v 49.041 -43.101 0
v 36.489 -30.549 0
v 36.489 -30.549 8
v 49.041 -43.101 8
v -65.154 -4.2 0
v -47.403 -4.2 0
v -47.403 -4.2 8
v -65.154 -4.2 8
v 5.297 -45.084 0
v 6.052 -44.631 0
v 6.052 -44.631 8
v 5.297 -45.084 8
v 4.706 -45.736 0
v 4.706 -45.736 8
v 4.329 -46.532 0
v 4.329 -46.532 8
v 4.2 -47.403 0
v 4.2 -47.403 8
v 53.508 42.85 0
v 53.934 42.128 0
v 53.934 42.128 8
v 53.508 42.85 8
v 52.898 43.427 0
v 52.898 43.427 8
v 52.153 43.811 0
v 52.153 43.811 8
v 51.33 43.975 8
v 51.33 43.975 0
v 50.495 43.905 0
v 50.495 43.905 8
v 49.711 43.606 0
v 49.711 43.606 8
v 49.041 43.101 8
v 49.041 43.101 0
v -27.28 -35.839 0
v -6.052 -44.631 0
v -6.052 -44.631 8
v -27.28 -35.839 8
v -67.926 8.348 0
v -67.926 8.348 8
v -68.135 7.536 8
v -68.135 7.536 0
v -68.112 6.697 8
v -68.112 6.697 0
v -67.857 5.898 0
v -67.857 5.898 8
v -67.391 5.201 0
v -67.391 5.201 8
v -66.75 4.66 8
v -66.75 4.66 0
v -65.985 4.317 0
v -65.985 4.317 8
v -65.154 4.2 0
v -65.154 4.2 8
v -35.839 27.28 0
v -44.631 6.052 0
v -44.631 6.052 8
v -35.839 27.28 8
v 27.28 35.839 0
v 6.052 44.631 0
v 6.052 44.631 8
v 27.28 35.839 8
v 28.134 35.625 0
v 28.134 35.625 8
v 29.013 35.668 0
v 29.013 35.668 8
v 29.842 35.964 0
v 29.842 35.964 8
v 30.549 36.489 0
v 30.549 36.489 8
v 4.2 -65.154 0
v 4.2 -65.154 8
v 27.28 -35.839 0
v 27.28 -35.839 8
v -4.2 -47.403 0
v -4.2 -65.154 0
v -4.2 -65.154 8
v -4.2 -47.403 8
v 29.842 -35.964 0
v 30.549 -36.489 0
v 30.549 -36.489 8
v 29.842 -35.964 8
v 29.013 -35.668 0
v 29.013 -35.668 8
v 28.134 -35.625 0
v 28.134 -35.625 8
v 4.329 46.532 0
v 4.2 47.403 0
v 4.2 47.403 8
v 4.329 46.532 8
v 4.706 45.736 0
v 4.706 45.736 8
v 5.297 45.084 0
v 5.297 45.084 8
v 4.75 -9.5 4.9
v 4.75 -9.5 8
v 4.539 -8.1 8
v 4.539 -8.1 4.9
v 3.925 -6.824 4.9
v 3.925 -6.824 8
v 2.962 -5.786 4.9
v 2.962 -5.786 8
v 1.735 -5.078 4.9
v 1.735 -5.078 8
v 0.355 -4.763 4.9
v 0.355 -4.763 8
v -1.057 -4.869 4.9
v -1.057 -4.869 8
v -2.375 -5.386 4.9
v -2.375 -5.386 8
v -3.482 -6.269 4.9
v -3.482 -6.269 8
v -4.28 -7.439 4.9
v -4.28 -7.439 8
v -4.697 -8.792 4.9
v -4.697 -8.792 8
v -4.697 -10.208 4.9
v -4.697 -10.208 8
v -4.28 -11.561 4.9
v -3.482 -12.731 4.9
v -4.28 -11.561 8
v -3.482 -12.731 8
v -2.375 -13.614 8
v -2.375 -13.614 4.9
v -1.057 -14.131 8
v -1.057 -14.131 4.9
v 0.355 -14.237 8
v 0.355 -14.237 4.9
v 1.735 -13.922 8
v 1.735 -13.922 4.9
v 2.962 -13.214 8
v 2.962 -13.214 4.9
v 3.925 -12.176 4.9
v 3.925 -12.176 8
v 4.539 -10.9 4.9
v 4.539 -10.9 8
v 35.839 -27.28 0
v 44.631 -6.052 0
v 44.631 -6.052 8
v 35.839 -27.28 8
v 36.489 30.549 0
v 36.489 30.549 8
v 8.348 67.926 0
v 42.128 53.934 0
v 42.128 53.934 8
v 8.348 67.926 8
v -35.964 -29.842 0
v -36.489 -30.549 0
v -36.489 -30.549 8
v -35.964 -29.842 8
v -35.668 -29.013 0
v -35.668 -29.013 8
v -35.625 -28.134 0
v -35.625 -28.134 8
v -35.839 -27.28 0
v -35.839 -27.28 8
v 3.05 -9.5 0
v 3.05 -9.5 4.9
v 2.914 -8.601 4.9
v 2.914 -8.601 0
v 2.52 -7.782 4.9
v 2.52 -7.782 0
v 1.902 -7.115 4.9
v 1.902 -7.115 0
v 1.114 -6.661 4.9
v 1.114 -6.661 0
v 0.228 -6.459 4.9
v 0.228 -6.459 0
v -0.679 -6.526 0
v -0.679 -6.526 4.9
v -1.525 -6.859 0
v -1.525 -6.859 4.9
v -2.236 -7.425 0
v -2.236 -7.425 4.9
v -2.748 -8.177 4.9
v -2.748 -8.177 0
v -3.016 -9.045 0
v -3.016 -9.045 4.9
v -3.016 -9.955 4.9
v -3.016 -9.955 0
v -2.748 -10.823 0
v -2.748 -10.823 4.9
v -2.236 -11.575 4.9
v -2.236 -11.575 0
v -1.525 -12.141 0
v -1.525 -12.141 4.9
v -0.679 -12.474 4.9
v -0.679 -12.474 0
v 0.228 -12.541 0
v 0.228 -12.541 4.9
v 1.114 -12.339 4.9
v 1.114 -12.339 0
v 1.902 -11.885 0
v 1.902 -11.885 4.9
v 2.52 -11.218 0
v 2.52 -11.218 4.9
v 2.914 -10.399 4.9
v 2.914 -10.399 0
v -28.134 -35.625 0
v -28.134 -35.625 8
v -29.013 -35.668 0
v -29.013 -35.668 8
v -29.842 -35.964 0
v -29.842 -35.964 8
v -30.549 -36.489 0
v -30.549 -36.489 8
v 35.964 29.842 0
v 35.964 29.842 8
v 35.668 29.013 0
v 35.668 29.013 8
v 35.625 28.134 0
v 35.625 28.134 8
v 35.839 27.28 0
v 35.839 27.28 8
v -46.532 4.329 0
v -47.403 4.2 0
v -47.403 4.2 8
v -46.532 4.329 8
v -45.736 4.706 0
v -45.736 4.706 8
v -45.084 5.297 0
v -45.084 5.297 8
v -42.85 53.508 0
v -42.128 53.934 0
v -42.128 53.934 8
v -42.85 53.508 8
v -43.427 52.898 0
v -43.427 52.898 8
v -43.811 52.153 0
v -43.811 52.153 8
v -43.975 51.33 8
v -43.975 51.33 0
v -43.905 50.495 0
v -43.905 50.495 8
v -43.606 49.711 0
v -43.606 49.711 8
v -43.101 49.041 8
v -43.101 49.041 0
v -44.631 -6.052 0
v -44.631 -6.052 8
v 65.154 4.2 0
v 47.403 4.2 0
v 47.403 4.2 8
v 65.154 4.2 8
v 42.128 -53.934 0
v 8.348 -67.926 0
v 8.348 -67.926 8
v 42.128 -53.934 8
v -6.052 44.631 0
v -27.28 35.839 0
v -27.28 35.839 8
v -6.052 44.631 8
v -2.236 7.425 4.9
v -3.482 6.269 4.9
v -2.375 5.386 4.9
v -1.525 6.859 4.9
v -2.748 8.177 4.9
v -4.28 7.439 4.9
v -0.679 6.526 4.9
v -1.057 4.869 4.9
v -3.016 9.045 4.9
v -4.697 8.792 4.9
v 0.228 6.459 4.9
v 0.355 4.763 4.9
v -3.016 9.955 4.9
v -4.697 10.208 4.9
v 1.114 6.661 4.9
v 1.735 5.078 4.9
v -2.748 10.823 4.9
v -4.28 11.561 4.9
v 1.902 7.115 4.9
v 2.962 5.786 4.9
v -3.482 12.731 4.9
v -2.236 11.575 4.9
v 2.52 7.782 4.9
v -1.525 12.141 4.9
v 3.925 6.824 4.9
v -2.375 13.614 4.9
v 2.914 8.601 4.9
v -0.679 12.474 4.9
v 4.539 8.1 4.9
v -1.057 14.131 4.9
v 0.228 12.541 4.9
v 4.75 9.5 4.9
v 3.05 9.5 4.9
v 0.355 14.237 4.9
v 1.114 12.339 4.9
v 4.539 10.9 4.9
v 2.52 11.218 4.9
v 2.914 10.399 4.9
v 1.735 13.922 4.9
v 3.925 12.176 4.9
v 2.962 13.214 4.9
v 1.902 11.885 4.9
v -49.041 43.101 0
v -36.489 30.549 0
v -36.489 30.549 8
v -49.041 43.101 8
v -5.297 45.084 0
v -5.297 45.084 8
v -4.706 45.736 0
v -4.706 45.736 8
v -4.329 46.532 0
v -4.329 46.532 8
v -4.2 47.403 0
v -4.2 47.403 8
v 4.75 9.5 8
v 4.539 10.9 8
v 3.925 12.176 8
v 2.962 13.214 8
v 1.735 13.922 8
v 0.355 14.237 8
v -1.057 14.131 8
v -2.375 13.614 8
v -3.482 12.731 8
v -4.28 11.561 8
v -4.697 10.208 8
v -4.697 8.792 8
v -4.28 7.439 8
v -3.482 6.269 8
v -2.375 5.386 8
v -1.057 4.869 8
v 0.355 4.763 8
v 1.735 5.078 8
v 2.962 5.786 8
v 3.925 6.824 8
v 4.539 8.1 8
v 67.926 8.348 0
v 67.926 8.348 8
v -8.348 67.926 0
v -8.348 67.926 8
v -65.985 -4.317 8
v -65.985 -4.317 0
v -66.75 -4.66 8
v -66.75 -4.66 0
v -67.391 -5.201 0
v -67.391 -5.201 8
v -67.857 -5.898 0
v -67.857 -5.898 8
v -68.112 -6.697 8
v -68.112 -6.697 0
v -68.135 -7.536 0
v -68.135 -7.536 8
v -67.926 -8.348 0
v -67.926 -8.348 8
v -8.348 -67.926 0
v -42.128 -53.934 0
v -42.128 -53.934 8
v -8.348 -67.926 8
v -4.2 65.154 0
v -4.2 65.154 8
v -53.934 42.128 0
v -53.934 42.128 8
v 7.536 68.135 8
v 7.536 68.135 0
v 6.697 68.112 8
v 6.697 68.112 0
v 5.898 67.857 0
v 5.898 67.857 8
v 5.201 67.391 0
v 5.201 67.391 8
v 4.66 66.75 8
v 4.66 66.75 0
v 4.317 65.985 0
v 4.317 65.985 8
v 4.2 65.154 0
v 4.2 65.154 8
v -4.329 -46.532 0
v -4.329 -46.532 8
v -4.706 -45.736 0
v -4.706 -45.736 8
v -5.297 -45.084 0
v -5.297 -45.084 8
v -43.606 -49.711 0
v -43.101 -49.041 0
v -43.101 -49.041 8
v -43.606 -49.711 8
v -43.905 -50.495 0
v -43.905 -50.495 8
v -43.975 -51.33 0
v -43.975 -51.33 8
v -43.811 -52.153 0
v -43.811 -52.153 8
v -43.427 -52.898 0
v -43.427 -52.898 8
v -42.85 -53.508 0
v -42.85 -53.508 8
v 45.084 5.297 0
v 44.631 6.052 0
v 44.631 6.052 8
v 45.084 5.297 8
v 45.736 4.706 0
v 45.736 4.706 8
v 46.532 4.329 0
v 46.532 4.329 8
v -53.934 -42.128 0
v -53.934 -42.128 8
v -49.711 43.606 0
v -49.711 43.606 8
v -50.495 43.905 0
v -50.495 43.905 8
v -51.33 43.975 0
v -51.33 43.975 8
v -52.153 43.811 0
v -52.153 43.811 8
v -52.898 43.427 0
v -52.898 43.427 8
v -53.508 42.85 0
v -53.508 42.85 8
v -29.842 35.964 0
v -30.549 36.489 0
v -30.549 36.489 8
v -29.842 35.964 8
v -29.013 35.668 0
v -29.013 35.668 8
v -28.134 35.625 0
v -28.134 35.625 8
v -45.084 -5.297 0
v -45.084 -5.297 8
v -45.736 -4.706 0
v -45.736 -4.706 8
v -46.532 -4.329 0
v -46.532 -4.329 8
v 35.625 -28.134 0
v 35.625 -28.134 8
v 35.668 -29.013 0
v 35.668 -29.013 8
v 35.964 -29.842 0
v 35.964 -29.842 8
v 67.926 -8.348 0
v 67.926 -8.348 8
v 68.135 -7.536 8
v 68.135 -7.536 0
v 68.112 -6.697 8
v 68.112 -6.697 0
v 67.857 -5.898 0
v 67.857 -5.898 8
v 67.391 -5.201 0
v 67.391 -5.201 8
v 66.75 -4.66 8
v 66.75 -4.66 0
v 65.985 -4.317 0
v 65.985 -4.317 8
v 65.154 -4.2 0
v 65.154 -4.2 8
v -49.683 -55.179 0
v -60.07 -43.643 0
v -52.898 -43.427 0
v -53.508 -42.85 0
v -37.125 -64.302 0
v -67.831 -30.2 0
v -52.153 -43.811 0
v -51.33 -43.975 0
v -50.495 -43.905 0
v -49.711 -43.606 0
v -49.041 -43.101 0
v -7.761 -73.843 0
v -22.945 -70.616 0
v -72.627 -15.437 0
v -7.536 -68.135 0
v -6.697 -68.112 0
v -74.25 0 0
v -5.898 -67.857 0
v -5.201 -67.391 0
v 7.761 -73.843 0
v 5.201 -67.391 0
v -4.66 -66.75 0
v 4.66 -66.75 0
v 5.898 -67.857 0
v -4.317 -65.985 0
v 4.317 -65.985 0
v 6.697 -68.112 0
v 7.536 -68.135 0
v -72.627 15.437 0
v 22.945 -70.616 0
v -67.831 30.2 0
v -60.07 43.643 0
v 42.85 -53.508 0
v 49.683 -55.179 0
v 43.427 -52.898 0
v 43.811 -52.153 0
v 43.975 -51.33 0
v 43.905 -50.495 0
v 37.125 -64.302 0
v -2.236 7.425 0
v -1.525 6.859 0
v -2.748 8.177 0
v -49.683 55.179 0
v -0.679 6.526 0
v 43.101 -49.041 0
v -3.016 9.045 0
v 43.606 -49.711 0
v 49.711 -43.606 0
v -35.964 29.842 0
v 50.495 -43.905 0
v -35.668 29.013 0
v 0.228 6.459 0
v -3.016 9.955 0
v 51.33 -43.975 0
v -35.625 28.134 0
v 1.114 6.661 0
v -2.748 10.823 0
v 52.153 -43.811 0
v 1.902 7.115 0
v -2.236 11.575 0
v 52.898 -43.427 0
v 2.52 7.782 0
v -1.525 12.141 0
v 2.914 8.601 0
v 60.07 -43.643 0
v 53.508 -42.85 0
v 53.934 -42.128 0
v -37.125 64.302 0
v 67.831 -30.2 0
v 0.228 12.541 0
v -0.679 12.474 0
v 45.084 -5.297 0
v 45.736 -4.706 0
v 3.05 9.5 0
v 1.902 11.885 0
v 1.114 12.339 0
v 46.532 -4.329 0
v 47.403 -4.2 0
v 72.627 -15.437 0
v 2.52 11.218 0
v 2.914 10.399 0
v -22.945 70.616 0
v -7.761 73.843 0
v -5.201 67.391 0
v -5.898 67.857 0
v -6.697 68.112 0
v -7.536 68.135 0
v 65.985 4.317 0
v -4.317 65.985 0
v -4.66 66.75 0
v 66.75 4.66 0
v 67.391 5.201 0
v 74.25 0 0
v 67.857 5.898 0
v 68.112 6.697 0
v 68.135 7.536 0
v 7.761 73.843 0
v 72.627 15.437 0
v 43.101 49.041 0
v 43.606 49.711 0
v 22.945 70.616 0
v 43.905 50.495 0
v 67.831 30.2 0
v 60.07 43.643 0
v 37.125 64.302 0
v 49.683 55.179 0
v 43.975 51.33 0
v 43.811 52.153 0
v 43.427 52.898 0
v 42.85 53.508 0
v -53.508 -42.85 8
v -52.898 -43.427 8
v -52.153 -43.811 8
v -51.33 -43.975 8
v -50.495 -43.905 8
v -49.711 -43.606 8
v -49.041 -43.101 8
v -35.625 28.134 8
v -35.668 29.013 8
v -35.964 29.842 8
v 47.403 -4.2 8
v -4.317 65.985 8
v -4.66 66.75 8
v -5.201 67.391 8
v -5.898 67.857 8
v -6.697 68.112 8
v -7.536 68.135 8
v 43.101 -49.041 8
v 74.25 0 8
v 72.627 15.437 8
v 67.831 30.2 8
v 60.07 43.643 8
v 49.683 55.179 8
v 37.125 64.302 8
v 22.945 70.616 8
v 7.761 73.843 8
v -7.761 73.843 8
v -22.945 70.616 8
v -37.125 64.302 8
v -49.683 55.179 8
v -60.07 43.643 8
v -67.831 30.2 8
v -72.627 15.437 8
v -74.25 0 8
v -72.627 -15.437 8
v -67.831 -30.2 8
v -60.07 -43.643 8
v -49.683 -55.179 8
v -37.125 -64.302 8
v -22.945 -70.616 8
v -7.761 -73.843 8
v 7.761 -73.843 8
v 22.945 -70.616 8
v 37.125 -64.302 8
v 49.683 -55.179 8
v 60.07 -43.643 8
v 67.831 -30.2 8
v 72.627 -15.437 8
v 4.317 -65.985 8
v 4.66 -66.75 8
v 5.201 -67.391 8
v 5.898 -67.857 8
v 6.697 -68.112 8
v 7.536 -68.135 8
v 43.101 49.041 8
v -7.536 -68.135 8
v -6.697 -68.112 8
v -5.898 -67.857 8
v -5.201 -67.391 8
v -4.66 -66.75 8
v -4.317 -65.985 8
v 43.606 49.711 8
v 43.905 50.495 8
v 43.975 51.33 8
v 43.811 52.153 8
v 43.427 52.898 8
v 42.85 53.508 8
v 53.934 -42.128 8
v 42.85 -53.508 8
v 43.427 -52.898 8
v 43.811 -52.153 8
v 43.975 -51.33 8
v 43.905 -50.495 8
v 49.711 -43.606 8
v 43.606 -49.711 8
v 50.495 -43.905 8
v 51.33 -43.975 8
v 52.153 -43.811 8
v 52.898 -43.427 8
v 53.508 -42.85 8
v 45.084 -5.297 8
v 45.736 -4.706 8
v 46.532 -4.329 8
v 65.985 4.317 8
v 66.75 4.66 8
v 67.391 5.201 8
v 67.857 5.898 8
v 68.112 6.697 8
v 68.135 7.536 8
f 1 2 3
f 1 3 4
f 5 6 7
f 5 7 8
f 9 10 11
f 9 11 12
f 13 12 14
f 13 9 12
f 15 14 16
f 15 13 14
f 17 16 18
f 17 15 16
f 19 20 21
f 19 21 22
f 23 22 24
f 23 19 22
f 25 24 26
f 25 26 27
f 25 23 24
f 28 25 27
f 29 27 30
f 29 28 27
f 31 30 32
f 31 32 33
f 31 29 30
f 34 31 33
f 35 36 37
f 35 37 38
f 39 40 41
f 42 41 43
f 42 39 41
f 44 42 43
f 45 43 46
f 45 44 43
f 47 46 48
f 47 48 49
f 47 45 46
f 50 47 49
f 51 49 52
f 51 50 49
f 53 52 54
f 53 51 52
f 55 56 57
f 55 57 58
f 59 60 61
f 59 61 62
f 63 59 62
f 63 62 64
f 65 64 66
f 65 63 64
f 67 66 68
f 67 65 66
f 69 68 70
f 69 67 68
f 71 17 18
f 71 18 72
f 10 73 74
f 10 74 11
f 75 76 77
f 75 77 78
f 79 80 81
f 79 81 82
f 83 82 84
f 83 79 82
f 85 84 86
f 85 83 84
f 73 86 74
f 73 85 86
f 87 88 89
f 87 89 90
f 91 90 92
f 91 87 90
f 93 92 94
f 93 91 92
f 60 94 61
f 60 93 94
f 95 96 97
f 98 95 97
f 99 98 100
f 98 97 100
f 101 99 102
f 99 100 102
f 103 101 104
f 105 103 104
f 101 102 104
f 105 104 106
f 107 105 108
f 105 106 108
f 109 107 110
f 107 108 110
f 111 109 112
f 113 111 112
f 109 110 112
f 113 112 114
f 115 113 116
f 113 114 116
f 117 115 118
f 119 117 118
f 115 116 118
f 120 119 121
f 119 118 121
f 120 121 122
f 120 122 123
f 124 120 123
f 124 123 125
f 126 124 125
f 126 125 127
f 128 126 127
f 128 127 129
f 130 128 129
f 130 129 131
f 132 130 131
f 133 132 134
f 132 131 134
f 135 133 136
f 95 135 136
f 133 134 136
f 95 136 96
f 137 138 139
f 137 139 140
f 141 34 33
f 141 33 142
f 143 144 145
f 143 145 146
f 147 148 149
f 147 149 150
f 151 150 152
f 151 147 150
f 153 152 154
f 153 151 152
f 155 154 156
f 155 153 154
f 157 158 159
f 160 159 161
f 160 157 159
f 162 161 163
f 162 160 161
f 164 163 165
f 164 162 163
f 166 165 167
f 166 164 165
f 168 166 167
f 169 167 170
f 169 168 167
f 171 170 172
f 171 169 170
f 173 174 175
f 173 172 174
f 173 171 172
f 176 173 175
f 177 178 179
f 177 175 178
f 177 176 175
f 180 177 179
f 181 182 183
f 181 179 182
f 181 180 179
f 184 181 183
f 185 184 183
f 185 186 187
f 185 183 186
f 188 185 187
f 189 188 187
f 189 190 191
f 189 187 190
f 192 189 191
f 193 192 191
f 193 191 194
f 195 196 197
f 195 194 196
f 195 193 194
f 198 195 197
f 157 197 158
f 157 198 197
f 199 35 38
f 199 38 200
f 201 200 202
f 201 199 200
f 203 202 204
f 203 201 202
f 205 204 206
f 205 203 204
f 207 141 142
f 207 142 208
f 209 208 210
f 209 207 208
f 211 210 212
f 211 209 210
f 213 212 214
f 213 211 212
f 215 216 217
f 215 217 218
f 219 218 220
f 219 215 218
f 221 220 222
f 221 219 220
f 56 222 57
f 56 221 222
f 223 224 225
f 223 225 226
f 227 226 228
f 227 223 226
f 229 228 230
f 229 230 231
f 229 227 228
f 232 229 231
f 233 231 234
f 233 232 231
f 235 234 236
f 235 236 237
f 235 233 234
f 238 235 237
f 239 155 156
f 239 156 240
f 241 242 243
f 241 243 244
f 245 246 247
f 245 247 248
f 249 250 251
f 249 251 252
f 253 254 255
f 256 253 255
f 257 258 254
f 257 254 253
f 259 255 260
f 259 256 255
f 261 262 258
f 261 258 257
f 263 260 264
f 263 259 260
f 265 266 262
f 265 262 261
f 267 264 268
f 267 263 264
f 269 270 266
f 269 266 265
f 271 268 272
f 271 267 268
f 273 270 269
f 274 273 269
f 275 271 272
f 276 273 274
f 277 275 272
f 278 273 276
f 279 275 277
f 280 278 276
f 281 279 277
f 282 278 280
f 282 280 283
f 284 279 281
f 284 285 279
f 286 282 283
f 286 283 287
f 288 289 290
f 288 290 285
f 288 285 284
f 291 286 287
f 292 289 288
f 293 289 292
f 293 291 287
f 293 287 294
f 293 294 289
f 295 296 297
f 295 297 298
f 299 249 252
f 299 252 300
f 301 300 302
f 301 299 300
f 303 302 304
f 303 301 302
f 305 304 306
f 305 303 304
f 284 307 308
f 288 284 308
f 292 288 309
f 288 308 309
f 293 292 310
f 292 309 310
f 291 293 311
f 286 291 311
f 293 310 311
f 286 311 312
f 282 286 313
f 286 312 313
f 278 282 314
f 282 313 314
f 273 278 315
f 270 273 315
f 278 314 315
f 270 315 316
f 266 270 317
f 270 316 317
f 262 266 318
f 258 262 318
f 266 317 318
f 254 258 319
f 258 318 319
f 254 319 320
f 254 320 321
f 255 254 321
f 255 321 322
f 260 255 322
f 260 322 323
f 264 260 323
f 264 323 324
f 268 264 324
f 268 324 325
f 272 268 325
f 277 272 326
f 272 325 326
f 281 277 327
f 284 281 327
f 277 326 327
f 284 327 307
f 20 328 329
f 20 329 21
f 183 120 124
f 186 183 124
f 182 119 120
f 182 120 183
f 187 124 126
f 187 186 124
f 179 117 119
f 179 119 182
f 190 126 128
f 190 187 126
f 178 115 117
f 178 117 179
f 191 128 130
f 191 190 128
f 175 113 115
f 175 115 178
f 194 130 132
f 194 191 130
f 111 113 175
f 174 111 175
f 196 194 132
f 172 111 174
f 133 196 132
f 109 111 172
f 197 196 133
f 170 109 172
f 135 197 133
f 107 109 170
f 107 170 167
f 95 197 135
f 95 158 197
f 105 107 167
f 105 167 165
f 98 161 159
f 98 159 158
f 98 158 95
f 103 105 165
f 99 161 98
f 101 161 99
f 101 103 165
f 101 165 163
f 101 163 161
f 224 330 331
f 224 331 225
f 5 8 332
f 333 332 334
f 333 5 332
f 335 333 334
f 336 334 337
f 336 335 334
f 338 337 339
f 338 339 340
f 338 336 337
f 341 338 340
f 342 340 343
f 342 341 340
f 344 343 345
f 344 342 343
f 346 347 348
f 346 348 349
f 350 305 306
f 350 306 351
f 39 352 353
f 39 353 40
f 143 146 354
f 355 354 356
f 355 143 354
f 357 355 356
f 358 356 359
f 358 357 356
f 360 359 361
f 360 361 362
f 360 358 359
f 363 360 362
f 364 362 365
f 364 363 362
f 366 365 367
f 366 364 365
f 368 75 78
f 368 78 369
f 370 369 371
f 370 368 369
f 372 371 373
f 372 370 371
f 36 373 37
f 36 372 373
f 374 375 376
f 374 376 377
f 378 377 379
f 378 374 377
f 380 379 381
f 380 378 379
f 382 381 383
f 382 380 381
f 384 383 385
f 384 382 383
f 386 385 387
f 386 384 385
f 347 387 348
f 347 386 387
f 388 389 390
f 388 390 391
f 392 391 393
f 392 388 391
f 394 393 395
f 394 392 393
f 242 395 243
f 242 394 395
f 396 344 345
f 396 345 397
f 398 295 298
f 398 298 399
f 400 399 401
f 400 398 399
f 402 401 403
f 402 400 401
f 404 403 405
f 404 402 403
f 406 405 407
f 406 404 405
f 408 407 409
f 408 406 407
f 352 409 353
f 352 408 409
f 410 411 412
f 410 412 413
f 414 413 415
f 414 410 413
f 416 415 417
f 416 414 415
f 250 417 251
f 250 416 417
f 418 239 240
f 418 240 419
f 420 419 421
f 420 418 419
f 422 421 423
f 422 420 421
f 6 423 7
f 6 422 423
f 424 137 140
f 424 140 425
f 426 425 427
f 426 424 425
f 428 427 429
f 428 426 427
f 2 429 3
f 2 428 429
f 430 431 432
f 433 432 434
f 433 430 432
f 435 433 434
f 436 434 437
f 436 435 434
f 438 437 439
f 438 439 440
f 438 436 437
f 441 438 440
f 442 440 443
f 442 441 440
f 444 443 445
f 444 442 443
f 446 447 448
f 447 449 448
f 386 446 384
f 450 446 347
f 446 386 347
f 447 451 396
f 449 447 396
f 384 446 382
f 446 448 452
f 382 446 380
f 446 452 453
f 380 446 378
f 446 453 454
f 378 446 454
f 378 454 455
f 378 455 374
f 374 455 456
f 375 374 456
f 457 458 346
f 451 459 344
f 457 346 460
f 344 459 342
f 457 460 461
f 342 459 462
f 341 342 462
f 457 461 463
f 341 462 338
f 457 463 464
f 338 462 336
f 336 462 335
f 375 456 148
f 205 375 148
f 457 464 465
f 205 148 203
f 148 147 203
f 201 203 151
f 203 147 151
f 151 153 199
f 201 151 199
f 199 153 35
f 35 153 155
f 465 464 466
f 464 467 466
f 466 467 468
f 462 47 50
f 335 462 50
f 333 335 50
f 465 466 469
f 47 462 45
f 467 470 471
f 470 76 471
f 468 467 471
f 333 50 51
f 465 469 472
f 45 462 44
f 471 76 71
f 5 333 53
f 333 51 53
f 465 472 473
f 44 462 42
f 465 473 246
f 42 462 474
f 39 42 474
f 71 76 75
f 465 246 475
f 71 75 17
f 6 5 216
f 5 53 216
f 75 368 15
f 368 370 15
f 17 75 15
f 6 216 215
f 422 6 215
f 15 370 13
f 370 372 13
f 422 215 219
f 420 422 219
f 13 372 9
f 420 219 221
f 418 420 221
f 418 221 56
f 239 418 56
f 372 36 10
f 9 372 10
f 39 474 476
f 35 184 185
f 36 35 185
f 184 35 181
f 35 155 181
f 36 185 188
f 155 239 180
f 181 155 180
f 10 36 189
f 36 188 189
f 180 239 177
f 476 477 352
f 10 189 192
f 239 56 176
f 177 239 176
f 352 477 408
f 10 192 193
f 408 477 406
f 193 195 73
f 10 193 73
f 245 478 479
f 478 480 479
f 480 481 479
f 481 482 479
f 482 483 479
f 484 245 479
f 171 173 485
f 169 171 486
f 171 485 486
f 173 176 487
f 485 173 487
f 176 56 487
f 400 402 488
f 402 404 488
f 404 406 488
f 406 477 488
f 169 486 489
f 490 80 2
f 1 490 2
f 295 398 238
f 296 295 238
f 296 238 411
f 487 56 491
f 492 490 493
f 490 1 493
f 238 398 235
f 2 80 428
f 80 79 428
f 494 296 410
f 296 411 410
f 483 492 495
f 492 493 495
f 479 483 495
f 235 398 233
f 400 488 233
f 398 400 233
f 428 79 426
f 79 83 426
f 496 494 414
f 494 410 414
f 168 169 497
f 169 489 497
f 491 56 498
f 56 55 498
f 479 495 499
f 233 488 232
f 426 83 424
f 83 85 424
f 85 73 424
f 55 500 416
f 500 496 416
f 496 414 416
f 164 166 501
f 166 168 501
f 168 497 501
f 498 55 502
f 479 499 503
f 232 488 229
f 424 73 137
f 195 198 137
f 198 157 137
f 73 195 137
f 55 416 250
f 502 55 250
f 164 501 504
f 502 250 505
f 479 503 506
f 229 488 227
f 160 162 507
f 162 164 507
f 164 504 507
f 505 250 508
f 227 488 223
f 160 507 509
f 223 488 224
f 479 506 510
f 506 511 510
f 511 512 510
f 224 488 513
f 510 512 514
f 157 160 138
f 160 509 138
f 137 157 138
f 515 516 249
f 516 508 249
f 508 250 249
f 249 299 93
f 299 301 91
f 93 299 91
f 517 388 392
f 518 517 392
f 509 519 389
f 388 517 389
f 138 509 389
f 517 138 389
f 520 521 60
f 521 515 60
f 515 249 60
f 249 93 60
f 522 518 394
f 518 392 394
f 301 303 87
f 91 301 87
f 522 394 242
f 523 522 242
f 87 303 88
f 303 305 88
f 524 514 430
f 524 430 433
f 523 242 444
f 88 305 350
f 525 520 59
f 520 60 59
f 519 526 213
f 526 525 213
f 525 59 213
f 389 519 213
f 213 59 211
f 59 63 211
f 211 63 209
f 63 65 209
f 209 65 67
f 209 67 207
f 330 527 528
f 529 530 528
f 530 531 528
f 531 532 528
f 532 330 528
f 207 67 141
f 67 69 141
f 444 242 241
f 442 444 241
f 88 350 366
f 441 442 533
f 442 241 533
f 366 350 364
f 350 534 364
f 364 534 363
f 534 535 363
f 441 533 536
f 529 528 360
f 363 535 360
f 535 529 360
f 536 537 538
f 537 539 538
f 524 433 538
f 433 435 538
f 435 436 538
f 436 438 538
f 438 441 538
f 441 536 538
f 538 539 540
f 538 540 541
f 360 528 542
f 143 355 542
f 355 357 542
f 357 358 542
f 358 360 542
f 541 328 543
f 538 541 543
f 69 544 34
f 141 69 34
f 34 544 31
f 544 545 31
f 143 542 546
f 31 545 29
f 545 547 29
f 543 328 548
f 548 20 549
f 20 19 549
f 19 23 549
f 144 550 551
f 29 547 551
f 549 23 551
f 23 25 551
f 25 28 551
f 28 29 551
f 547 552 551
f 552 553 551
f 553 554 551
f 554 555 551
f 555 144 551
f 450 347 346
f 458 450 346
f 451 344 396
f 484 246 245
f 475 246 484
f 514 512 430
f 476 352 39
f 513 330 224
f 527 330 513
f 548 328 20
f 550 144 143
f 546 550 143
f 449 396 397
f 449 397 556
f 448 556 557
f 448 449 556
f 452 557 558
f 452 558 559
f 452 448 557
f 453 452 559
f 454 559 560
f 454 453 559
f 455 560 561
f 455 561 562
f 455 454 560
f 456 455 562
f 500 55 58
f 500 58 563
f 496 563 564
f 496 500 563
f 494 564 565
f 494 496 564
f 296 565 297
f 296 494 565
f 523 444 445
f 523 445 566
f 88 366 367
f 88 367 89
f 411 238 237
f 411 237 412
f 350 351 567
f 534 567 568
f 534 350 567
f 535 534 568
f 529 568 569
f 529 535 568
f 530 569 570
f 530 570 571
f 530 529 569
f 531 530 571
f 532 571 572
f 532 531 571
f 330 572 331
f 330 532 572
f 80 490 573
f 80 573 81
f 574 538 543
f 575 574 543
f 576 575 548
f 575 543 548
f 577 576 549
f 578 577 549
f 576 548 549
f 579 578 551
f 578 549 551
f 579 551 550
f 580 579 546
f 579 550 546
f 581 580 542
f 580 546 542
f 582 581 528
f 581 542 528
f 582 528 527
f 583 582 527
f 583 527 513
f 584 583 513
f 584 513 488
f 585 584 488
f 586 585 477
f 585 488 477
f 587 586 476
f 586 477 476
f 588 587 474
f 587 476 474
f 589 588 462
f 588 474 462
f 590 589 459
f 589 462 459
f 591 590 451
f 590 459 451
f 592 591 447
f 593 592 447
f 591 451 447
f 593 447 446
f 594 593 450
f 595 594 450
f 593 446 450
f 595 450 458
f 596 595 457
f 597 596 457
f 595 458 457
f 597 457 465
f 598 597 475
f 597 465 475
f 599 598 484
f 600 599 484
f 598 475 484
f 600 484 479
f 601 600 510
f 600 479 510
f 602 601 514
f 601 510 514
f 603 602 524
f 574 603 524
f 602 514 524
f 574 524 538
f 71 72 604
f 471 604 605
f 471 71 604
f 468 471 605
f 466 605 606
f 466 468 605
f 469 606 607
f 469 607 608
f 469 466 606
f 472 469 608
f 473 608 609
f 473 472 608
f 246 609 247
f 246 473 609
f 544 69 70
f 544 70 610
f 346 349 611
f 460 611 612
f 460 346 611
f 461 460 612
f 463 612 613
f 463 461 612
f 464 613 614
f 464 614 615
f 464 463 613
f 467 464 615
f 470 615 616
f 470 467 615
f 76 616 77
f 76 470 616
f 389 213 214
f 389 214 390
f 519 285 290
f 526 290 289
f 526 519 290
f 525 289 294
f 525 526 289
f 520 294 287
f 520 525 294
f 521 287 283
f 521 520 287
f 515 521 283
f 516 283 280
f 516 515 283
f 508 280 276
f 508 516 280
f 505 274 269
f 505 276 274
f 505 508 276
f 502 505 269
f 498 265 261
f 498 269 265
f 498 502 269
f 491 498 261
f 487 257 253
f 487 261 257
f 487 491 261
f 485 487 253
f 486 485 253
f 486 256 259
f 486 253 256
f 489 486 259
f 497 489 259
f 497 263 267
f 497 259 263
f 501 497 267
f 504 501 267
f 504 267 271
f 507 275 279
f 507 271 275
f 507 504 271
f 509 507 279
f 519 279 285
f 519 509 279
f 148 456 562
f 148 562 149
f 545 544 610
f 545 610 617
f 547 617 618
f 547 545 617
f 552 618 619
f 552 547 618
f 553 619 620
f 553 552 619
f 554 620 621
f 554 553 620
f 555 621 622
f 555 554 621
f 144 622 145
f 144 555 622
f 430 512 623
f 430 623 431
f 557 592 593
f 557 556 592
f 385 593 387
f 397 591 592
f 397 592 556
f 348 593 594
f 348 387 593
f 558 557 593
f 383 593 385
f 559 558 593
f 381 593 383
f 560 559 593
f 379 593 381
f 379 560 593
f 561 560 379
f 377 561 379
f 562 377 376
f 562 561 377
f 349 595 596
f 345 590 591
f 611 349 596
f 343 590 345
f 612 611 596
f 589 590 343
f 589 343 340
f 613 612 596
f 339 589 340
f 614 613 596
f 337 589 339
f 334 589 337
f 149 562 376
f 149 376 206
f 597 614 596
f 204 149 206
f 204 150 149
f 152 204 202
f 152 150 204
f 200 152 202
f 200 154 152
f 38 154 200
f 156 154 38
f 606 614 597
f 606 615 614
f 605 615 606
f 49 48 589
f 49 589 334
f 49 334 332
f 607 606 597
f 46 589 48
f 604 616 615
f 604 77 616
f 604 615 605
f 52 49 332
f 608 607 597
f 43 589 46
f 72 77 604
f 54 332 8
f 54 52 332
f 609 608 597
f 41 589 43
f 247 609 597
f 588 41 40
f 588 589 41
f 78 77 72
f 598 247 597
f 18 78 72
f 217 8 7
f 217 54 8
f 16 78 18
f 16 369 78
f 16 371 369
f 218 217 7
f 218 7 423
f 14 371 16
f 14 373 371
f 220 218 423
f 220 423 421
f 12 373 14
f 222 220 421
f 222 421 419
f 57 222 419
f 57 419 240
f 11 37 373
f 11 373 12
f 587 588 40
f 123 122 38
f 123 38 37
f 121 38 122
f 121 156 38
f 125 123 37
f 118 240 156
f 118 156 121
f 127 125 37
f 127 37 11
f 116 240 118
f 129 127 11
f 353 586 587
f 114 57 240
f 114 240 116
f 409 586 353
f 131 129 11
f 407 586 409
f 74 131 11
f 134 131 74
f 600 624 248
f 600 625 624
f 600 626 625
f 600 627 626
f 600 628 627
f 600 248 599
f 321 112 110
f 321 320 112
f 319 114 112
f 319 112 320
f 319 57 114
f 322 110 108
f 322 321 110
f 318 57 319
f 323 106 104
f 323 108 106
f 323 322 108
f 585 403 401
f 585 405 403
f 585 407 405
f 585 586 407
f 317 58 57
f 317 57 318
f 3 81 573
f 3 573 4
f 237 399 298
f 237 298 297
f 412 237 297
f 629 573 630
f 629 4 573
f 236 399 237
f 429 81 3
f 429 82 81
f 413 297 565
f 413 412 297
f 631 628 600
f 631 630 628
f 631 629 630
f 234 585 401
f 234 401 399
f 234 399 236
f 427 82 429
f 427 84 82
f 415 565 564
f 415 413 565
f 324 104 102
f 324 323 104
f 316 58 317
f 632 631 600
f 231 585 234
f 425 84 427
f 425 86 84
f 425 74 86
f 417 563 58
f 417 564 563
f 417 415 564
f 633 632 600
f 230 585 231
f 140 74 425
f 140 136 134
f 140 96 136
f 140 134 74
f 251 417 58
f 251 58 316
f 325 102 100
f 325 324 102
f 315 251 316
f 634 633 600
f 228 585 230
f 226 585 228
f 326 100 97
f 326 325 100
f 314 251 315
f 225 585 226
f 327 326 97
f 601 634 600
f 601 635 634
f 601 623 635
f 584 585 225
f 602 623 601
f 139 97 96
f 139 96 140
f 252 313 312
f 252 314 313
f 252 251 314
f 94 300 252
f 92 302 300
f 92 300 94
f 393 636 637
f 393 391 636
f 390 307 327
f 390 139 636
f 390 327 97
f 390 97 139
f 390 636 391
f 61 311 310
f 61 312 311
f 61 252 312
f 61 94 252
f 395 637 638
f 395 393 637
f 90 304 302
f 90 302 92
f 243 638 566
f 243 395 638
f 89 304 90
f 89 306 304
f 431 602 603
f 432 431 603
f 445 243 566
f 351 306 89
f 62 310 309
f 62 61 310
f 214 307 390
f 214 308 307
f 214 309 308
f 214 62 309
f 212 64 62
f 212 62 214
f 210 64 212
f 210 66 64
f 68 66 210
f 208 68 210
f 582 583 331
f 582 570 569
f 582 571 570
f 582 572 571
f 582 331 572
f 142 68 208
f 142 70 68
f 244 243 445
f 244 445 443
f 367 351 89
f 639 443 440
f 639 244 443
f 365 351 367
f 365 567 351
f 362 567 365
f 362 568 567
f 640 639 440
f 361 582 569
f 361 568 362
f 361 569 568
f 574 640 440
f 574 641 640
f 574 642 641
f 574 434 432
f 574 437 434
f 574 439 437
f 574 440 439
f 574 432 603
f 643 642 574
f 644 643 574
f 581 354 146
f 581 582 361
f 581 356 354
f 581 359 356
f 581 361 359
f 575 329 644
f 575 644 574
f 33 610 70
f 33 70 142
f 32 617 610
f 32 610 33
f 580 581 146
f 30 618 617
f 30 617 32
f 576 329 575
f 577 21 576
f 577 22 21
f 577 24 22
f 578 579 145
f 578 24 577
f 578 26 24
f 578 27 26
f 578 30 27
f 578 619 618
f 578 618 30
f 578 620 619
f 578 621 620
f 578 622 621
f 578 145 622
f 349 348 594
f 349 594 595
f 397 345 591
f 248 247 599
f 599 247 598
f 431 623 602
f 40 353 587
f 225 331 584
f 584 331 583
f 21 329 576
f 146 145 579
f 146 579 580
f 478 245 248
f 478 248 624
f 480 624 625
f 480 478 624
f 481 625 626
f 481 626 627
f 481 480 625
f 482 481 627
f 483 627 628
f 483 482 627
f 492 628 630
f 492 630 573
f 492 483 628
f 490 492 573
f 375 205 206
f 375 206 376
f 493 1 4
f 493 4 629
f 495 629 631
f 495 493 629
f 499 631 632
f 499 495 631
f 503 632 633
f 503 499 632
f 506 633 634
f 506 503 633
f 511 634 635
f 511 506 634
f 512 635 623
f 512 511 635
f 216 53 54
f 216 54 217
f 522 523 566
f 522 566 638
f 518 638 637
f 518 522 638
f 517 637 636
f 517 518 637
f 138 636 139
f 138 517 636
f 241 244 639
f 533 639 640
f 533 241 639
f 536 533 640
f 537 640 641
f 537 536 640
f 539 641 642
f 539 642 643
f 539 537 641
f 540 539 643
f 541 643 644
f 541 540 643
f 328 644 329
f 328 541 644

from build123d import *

# Parameters (mm, degrees)
SKETCH1_R           = 74.25
SKETCH1_R_2         = 3.05
BOSS_EXTRUDE1_DEPTH = 8
SKETCH2_R           = 4.75
CUT_EXTRUDE1_DEPTH  = 3.1


with BuildPart() as part:
    # Sketch1 → Boss-Extrude1 (new body)
    with BuildSketch(Plane.XY):
        Circle(SKETCH1_R)
        with Locations((0, 9.5)):
            Circle(SKETCH1_R_2, mode=Mode.SUBTRACT)
        with Locations((0, -9.5)):
            Circle(SKETCH1_R_2, mode=Mode.SUBTRACT)
        with BuildLine():
            Line((67.925889957, 8.348050297), (53.933820381, 42.127894432))
            ThreePointArc((53.933820381, 42.127894432), (51.74745275, 43.922199976), (49.04086144, 43.101164478))
            Line((49.04086144, 43.101164478), (36.488844859, 30.549147897))
            ThreePointArc((36.488844859, 30.549147897), (35.667809361, 29.013098519), (35.838526605, 27.279777256))
            Line((35.838526605, 27.279777256), (44.631380677, 6.051949703))
            ThreePointArc((44.631380677, 6.051949703), (45.736308575, 4.705591163), (47.403019275, 4.2))
            Line((47.403019275, 4.2), (65.154251359, 4.2))
            ThreePointArc((65.154251359, 4.2), (67.648660196, 5.533289301), (67.925889957, 8.348050297))
        make_face(mode=Mode.SUBTRACT)
        with BuildLine():
            Line((42.127894432, 53.933820381), (8.348050297, 67.925889957))
            ThreePointArc((8.348050297, 67.925889957), (5.533289301, 67.648660196), (4.2, 65.154251359))
            Line((4.2, 65.154251359), (4.2, 47.403019275))
            ThreePointArc((4.2, 47.403019275), (4.705591163, 45.736308575), (6.051949703, 44.631380677))
            Line((6.051949703, 44.631380677), (27.279777256, 35.838526605))
            ThreePointArc((27.279777256, 35.838526605), (29.013098519, 35.667809361), (30.549147897, 36.488844859))
            Line((30.549147897, 36.488844859), (43.101164478, 49.04086144))
            ThreePointArc((43.101164478, 49.04086144), (43.922199976, 51.74745275), (42.127894432, 53.933820381))
        make_face(mode=Mode.SUBTRACT)
        with BuildLine():
            Line((-8.348050297, 67.925889957), (-42.127894432, 53.933820381))
            ThreePointArc((-42.127894432, 53.933820381), (-43.922199976, 51.74745275), (-43.101164478, 49.04086144))
            Line((-43.101164478, 49.04086144), (-30.549147897, 36.488844859))
            ThreePointArc((-30.549147897, 36.488844859), (-29.013098519, 35.667809361), (-27.279777256, 35.838526605))
            Line((-27.279777256, 35.838526605), (-6.051949703, 44.631380677))
            ThreePointArc((-6.051949703, 44.631380677), (-4.705591163, 45.736308575), (-4.2, 47.403019275))
            Line((-4.2, 47.403019275), (-4.2, 65.154251359))
            ThreePointArc((-4.2, 65.154251359), (-5.533289301, 67.648660196), (-8.348050297, 67.925889957))
        make_face(mode=Mode.SUBTRACT)
        with BuildLine():
            Line((-53.933820381, 42.127894432), (-67.925889957, 8.348050297))
            ThreePointArc((-67.925889957, 8.348050297), (-67.648660196, 5.533289301), (-65.154251359, 4.2))
            Line((-65.154251359, 4.2), (-47.403019275, 4.2))
            ThreePointArc((-47.403019275, 4.2), (-45.736308575, 4.705591163), (-44.631380677, 6.051949703))
            Line((-44.631380677, 6.051949703), (-35.838526605, 27.279777256))
            ThreePointArc((-35.838526605, 27.279777256), (-35.667809361, 29.013098519), (-36.488844859, 30.549147897))
            Line((-36.488844859, 30.549147897), (-49.04086144, 43.101164478))
            ThreePointArc((-49.04086144, 43.101164478), (-51.74745275, 43.922199976), (-53.933820381, 42.127894432))
        make_face(mode=Mode.SUBTRACT)
        with BuildLine():
            Line((-67.925889957, -8.348050297), (-53.933820381, -42.127894432))
            ThreePointArc((-53.933820381, -42.127894432), (-51.74745275, -43.922199976), (-49.04086144, -43.101164478))
            Line((-49.04086144, -43.101164478), (-36.488844859, -30.549147897))
            ThreePointArc((-36.488844859, -30.549147897), (-35.667809361, -29.013098519), (-35.838526605, -27.279777256))
            Line((-35.838526605, -27.279777256), (-44.631380677, -6.051949703))
            ThreePointArc((-44.631380677, -6.051949703), (-45.736308575, -4.705591163), (-47.403019275, -4.2))
            Line((-47.403019275, -4.2), (-65.154251359, -4.2))
            ThreePointArc((-65.154251359, -4.2), (-67.648660196, -5.533289301), (-67.925889957, -8.348050297))
        make_face(mode=Mode.SUBTRACT)
        with BuildLine():
            Line((-42.127894432, -53.933820381), (-8.348050297, -67.925889957))
            ThreePointArc((-8.348050297, -67.925889957), (-5.533289301, -67.648660196), (-4.2, -65.154251359))
            Line((-4.2, -65.154251359), (-4.2, -47.403019275))
            ThreePointArc((-4.2, -47.403019275), (-4.705591163, -45.736308575), (-6.051949703, -44.631380677))
            Line((-6.051949703, -44.631380677), (-27.279777256, -35.838526605))
            ThreePointArc((-27.279777256, -35.838526605), (-29.013098519, -35.667809361), (-30.549147897, -36.488844859))
            Line((-30.549147897, -36.488844859), (-43.101164478, -49.04086144))
            ThreePointArc((-43.101164478, -49.04086144), (-43.922199976, -51.74745275), (-42.127894432, -53.933820381))
        make_face(mode=Mode.SUBTRACT)
        with BuildLine():
            Line((8.348050297, -67.925889957), (42.127894432, -53.933820381))
            ThreePointArc((42.127894432, -53.933820381), (43.922199976, -51.74745275), (43.101164478, -49.04086144))
            Line((43.101164478, -49.04086144), (30.549147897, -36.488844859))
            ThreePointArc((30.549147897, -36.488844859), (29.013098519, -35.667809361), (27.279777256, -35.838526605))
            Line((27.279777256, -35.838526605), (6.051949703, -44.631380677))
            ThreePointArc((6.051949703, -44.631380677), (4.705591163, -45.736308575), (4.2, -47.403019275))
            Line((4.2, -47.403019275), (4.2, -65.154251359))
            ThreePointArc((4.2, -65.154251359), (5.533289301, -67.648660196), (8.348050297, -67.925889957))
        make_face(mode=Mode.SUBTRACT)
        with BuildLine():
            Line((53.933820381, -42.127894432), (67.925889957, -8.348050297))
            ThreePointArc((67.925889957, -8.348050297), (67.648660196, -5.533289301), (65.154251359, -4.2))
            Line((65.154251359, -4.2), (47.403019275, -4.2))
            ThreePointArc((47.403019275, -4.2), (45.736308575, -4.705591163), (44.631380677, -6.051949703))
            Line((44.631380677, -6.051949703), (35.838526605, -27.279777256))
            ThreePointArc((35.838526605, -27.279777256), (35.667809361, -29.013098519), (36.488844859, -30.549147897))
            Line((36.488844859, -30.549147897), (49.04086144, -43.101164478))
            ThreePointArc((49.04086144, -43.101164478), (51.74745275, -43.922199976), (53.933820381, -42.127894432))
        make_face(mode=Mode.SUBTRACT)
    extrude(amount=BOSS_EXTRUDE1_DEPTH)

    # Sketch2 → Cut-Extrude1 (cut)
    with BuildSketch(Plane.XY.offset(8)):
        with Locations((0, -9.5)):
            Circle(SKETCH2_R)
        with Locations((0, 9.5)):
            Circle(SKETCH2_R)
    extrude(amount=-CUT_EXTRUDE1_DEPTH, mode=Mode.SUBTRACT)


solid = part.part
